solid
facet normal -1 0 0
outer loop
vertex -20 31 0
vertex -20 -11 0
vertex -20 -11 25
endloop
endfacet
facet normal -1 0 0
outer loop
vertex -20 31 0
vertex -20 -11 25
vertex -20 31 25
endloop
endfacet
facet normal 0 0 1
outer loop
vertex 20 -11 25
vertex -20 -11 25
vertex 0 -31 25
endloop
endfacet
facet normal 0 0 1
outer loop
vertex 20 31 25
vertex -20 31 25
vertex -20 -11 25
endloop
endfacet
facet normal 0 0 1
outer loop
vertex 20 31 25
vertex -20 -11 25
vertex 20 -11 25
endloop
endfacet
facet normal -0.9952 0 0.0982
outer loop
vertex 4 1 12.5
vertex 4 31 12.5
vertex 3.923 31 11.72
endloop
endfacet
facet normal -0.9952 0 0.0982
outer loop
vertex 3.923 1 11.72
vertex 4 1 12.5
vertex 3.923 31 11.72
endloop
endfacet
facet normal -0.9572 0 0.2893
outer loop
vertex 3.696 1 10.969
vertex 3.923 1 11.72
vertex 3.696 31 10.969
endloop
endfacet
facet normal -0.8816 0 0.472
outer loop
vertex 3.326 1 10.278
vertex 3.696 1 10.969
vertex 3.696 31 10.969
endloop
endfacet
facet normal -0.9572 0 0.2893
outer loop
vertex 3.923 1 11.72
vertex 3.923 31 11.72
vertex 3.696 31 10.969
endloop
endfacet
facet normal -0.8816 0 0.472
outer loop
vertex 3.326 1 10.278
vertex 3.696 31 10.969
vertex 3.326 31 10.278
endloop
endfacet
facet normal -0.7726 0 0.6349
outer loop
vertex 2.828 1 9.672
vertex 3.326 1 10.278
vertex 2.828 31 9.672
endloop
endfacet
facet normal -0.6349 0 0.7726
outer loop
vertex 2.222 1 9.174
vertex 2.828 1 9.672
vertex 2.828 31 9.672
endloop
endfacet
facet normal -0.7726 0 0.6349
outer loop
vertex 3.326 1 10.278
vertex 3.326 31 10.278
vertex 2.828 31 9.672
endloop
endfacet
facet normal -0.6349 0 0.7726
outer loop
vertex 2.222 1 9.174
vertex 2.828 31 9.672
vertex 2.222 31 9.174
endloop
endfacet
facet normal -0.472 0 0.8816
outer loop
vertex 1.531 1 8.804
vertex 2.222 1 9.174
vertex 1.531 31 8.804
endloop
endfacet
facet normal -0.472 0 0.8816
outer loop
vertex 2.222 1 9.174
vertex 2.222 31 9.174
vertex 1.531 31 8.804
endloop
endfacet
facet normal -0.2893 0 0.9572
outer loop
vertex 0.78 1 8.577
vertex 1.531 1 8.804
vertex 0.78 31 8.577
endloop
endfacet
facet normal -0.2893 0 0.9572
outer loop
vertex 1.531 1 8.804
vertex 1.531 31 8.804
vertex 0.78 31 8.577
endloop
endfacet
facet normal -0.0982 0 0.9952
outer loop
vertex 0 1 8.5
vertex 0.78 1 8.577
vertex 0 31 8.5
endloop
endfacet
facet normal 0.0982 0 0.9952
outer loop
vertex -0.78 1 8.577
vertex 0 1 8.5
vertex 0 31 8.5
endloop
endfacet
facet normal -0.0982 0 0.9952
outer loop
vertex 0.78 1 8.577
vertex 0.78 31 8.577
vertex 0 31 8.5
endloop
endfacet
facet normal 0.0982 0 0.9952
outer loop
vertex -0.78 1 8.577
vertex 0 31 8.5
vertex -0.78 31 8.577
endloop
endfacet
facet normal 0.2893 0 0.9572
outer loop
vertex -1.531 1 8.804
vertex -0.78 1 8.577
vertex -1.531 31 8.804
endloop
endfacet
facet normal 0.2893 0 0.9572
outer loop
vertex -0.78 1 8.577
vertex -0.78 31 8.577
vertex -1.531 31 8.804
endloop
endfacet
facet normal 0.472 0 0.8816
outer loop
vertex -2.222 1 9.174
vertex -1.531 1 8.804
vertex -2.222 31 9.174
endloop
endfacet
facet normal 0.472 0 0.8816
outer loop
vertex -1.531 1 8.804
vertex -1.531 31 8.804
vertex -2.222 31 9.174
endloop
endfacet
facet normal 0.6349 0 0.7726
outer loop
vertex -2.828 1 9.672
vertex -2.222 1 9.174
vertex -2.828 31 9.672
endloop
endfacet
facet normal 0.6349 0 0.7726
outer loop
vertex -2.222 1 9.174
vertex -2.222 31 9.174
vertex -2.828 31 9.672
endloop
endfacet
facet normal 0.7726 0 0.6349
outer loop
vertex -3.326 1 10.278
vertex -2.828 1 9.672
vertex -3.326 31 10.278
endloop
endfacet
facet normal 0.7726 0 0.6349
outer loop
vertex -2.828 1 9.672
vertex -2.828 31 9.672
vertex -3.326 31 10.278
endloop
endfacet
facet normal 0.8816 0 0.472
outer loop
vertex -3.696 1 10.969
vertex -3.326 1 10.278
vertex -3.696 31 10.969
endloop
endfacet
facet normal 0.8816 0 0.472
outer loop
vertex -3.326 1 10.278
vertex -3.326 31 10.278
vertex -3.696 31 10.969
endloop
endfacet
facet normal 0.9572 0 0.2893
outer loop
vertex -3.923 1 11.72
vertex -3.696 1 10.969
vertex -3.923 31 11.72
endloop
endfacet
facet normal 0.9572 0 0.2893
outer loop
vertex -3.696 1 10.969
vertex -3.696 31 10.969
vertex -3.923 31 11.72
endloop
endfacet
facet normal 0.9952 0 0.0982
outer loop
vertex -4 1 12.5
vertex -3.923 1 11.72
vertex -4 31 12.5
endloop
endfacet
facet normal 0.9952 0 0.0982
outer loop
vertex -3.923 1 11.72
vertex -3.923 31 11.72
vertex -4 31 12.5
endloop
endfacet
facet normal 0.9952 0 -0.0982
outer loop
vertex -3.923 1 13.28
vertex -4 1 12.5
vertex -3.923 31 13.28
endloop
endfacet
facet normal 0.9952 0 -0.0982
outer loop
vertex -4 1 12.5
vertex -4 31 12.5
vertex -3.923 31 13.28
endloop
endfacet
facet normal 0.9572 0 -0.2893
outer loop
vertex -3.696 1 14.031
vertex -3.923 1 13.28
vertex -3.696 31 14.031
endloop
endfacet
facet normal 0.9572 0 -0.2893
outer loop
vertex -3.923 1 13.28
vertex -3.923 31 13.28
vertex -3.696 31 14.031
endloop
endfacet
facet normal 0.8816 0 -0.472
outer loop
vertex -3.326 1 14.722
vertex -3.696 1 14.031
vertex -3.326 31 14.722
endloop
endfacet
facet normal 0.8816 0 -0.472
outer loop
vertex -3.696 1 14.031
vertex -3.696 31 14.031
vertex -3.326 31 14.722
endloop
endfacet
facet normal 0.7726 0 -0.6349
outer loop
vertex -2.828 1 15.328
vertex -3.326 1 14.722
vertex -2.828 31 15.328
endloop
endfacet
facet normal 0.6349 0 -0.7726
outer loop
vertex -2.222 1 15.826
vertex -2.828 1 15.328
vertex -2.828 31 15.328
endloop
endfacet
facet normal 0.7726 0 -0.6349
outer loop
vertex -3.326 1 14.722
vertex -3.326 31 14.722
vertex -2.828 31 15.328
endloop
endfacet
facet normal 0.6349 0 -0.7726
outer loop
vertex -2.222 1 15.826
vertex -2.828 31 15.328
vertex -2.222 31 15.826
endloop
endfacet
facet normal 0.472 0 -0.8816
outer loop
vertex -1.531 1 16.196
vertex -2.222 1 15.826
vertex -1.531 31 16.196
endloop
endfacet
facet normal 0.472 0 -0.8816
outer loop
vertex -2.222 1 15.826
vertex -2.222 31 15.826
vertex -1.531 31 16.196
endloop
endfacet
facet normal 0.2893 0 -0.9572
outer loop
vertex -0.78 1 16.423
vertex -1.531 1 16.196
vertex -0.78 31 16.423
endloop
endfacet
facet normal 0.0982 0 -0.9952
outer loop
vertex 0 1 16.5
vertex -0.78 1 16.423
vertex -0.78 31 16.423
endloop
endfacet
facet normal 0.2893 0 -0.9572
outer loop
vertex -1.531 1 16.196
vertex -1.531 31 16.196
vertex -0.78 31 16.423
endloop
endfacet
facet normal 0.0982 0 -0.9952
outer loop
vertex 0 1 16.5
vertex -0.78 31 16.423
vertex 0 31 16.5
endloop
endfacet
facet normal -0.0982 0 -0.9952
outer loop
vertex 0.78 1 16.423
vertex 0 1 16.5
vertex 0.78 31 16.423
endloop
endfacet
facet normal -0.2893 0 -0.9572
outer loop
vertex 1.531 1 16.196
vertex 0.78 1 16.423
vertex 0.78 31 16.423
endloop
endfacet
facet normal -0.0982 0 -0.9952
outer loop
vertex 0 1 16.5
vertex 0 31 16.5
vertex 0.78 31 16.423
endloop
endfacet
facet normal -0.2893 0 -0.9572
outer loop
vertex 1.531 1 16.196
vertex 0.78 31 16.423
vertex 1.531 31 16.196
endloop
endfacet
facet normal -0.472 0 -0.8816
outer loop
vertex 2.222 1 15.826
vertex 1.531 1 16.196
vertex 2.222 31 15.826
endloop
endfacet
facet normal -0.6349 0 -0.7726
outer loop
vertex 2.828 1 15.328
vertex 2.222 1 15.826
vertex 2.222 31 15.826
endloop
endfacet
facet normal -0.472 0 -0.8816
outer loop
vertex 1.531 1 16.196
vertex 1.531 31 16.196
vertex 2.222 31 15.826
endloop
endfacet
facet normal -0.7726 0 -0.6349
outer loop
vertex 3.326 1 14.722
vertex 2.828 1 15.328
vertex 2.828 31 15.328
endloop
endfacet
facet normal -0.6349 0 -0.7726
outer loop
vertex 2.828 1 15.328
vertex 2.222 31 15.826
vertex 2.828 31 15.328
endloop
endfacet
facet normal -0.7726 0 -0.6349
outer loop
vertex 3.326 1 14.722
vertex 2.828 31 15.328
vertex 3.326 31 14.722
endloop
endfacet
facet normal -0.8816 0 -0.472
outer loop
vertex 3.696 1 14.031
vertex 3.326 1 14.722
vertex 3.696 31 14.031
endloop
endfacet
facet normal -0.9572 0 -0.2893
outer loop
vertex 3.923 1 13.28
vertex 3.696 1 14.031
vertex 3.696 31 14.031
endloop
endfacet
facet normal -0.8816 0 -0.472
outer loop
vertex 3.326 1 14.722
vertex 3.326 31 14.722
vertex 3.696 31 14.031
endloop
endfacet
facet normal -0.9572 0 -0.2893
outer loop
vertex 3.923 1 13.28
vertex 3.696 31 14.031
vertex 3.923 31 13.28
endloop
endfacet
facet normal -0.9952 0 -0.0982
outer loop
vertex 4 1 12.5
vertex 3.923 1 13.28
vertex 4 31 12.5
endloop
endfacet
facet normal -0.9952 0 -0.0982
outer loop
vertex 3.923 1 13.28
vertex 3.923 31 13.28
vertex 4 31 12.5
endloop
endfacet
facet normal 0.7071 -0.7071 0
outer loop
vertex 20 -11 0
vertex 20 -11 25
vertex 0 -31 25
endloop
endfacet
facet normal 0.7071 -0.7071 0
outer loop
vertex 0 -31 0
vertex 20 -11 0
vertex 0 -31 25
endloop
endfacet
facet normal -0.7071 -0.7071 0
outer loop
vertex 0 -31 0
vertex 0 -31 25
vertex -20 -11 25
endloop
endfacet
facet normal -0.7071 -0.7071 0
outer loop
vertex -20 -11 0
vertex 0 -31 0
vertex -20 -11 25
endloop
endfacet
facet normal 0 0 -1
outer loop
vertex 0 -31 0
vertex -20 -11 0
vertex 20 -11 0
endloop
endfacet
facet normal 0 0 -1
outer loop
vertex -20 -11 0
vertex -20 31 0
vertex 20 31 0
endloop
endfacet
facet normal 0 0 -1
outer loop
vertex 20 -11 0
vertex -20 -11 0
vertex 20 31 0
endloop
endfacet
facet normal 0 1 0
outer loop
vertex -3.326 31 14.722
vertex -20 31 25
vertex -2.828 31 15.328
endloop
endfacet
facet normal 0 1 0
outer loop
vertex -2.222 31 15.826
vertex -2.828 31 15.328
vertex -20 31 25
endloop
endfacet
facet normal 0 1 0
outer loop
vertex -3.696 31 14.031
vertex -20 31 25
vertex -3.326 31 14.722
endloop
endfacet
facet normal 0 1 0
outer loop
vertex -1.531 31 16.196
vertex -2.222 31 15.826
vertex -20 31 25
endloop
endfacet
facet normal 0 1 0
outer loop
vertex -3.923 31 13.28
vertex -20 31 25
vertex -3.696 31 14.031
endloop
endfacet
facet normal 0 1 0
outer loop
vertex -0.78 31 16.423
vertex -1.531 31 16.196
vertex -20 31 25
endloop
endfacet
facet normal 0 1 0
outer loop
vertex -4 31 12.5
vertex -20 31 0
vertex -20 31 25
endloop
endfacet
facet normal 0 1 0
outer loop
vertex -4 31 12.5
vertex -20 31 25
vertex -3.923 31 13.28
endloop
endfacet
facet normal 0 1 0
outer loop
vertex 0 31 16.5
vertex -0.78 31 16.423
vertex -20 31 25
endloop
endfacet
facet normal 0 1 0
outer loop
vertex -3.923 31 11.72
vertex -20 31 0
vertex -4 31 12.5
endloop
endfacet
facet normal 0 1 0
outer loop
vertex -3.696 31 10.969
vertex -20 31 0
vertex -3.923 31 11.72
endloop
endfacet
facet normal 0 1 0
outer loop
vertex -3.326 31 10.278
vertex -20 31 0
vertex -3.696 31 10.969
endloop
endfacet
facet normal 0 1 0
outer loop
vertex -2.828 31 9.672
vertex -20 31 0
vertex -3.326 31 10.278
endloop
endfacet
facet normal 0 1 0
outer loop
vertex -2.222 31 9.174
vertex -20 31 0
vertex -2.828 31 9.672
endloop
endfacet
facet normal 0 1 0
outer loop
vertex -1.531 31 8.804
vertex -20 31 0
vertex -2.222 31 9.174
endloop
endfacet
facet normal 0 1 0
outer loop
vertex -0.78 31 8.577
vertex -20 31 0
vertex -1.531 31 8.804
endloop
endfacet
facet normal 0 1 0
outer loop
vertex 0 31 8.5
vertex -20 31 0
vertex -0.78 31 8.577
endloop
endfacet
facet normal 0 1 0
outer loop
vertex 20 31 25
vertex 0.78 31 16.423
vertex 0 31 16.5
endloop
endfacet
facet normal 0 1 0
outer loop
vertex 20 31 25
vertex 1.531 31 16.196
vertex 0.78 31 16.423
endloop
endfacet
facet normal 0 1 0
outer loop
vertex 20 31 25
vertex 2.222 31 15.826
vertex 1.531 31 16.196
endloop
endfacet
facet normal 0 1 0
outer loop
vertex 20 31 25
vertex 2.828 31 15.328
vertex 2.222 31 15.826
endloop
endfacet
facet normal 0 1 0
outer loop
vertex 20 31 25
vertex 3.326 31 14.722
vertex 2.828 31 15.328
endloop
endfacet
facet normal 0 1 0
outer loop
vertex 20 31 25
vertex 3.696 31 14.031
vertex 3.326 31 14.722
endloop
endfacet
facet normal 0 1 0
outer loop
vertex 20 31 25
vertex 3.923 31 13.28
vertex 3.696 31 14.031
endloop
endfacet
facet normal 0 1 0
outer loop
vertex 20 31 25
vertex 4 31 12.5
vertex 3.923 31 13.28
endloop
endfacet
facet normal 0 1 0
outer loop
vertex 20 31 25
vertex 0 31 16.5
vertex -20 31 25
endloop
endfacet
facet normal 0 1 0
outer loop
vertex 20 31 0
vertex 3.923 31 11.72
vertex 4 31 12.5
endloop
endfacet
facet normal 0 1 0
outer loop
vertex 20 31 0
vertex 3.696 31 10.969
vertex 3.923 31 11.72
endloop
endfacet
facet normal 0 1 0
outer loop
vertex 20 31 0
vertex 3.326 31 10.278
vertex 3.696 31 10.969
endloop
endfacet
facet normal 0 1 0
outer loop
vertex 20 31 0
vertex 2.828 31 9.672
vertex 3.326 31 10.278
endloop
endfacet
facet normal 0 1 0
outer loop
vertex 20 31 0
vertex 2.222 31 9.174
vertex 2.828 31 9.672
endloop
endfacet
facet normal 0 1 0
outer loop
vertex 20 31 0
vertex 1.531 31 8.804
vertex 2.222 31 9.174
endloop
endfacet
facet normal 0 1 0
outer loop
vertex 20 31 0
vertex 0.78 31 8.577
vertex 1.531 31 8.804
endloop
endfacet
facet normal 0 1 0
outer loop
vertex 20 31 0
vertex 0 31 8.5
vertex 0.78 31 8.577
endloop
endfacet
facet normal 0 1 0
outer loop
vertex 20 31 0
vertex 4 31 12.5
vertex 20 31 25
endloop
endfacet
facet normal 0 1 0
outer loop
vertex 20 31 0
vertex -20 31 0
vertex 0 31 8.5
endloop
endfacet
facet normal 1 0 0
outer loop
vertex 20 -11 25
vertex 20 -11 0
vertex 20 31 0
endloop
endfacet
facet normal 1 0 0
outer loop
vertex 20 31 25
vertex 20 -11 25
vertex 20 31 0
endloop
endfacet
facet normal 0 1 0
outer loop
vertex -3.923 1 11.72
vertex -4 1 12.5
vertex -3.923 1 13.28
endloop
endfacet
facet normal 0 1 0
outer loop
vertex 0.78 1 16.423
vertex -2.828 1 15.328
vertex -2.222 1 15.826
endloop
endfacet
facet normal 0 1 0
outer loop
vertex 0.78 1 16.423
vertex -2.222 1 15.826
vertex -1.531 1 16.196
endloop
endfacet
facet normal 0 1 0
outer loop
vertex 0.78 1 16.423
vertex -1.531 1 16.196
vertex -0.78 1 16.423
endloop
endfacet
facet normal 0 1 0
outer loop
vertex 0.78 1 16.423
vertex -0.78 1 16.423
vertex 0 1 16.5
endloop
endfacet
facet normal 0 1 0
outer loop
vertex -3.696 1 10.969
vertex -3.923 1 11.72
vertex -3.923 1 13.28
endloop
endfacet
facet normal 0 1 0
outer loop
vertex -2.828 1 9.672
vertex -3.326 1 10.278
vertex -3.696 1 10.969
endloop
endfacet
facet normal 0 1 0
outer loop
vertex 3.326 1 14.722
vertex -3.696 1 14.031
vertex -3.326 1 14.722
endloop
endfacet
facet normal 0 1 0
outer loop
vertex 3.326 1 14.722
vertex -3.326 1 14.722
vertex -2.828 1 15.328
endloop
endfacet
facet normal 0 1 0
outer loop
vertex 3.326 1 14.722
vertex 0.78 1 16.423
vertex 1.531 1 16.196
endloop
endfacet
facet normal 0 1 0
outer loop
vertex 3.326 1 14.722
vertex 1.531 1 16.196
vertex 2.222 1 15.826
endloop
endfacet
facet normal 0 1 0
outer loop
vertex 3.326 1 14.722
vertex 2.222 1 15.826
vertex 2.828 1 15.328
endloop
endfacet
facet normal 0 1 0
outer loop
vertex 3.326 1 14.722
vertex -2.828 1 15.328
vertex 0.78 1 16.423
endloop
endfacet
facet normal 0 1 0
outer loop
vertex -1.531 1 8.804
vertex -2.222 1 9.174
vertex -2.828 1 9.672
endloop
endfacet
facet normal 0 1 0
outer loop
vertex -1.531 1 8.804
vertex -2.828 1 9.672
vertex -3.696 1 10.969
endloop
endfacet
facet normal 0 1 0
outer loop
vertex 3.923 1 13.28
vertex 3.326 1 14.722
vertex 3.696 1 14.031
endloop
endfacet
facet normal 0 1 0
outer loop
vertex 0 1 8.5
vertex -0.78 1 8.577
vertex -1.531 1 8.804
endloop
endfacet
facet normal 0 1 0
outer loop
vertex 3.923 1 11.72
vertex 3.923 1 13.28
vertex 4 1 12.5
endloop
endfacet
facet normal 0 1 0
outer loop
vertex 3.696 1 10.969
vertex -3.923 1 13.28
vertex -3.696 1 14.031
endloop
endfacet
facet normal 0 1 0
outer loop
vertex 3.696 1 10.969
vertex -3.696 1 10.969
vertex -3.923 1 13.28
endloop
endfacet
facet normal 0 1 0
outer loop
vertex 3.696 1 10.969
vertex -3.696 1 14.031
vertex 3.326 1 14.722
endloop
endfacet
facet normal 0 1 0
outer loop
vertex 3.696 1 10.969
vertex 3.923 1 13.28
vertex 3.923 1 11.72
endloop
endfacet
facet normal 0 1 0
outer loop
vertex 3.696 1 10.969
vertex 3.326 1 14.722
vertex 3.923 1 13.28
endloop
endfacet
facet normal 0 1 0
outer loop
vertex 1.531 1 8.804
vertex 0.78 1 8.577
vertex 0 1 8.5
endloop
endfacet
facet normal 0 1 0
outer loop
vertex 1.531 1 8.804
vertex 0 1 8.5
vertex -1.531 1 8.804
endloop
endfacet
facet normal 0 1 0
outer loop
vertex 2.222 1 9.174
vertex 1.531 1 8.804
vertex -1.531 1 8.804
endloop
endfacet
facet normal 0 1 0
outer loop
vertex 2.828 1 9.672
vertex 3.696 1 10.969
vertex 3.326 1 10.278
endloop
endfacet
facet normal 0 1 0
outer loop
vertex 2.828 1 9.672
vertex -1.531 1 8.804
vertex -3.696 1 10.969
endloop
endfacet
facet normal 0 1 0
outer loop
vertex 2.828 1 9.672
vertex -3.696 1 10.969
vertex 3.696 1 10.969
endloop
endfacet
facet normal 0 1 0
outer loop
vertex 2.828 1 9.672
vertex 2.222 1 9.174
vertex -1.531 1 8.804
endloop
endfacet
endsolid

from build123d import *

# Parameters (mm, degrees)
SKETCH1_W           = 40
SKETCH1_H           = 62
BOSS_EXTRUDE1_DEPTH = 25
CUT_EXTRUDE1_DEPTH  = 25
SKETCH3_R           = 4
CUT_EXTRUDE2_DEPTH  = 30


with BuildPart() as part:
    # Sketch1 → Boss-Extrude1 (new body)
    with BuildSketch(Plane.XY):
        Rectangle(SKETCH1_W, SKETCH1_H)
    extrude(amount=BOSS_EXTRUDE1_DEPTH)

    # Sketch2 → Cut-Extrude1 (cut)
    with BuildSketch(Plane.XY.offset(25)):
        Polygon((0, -31), (-20, -11), (-20, -38.533016332), (20, -38.533016332), (20, -11), align=None)
    extrude(amount=-CUT_EXTRUDE1_DEPTH, mode=Mode.SUBTRACT)

    # Sketch3 → Cut-Extrude2 (cut)
    with BuildSketch(Plane(origin=(0, 31, 0), x_dir=(1, 0, 0), z_dir=(0, 1, 0))):
        with Locations((0, -12.5)):
            Circle(SKETCH3_R)
    extrude(amount=-CUT_EXTRUDE2_DEPTH, mode=Mode.SUBTRACT)


solid = part.part
